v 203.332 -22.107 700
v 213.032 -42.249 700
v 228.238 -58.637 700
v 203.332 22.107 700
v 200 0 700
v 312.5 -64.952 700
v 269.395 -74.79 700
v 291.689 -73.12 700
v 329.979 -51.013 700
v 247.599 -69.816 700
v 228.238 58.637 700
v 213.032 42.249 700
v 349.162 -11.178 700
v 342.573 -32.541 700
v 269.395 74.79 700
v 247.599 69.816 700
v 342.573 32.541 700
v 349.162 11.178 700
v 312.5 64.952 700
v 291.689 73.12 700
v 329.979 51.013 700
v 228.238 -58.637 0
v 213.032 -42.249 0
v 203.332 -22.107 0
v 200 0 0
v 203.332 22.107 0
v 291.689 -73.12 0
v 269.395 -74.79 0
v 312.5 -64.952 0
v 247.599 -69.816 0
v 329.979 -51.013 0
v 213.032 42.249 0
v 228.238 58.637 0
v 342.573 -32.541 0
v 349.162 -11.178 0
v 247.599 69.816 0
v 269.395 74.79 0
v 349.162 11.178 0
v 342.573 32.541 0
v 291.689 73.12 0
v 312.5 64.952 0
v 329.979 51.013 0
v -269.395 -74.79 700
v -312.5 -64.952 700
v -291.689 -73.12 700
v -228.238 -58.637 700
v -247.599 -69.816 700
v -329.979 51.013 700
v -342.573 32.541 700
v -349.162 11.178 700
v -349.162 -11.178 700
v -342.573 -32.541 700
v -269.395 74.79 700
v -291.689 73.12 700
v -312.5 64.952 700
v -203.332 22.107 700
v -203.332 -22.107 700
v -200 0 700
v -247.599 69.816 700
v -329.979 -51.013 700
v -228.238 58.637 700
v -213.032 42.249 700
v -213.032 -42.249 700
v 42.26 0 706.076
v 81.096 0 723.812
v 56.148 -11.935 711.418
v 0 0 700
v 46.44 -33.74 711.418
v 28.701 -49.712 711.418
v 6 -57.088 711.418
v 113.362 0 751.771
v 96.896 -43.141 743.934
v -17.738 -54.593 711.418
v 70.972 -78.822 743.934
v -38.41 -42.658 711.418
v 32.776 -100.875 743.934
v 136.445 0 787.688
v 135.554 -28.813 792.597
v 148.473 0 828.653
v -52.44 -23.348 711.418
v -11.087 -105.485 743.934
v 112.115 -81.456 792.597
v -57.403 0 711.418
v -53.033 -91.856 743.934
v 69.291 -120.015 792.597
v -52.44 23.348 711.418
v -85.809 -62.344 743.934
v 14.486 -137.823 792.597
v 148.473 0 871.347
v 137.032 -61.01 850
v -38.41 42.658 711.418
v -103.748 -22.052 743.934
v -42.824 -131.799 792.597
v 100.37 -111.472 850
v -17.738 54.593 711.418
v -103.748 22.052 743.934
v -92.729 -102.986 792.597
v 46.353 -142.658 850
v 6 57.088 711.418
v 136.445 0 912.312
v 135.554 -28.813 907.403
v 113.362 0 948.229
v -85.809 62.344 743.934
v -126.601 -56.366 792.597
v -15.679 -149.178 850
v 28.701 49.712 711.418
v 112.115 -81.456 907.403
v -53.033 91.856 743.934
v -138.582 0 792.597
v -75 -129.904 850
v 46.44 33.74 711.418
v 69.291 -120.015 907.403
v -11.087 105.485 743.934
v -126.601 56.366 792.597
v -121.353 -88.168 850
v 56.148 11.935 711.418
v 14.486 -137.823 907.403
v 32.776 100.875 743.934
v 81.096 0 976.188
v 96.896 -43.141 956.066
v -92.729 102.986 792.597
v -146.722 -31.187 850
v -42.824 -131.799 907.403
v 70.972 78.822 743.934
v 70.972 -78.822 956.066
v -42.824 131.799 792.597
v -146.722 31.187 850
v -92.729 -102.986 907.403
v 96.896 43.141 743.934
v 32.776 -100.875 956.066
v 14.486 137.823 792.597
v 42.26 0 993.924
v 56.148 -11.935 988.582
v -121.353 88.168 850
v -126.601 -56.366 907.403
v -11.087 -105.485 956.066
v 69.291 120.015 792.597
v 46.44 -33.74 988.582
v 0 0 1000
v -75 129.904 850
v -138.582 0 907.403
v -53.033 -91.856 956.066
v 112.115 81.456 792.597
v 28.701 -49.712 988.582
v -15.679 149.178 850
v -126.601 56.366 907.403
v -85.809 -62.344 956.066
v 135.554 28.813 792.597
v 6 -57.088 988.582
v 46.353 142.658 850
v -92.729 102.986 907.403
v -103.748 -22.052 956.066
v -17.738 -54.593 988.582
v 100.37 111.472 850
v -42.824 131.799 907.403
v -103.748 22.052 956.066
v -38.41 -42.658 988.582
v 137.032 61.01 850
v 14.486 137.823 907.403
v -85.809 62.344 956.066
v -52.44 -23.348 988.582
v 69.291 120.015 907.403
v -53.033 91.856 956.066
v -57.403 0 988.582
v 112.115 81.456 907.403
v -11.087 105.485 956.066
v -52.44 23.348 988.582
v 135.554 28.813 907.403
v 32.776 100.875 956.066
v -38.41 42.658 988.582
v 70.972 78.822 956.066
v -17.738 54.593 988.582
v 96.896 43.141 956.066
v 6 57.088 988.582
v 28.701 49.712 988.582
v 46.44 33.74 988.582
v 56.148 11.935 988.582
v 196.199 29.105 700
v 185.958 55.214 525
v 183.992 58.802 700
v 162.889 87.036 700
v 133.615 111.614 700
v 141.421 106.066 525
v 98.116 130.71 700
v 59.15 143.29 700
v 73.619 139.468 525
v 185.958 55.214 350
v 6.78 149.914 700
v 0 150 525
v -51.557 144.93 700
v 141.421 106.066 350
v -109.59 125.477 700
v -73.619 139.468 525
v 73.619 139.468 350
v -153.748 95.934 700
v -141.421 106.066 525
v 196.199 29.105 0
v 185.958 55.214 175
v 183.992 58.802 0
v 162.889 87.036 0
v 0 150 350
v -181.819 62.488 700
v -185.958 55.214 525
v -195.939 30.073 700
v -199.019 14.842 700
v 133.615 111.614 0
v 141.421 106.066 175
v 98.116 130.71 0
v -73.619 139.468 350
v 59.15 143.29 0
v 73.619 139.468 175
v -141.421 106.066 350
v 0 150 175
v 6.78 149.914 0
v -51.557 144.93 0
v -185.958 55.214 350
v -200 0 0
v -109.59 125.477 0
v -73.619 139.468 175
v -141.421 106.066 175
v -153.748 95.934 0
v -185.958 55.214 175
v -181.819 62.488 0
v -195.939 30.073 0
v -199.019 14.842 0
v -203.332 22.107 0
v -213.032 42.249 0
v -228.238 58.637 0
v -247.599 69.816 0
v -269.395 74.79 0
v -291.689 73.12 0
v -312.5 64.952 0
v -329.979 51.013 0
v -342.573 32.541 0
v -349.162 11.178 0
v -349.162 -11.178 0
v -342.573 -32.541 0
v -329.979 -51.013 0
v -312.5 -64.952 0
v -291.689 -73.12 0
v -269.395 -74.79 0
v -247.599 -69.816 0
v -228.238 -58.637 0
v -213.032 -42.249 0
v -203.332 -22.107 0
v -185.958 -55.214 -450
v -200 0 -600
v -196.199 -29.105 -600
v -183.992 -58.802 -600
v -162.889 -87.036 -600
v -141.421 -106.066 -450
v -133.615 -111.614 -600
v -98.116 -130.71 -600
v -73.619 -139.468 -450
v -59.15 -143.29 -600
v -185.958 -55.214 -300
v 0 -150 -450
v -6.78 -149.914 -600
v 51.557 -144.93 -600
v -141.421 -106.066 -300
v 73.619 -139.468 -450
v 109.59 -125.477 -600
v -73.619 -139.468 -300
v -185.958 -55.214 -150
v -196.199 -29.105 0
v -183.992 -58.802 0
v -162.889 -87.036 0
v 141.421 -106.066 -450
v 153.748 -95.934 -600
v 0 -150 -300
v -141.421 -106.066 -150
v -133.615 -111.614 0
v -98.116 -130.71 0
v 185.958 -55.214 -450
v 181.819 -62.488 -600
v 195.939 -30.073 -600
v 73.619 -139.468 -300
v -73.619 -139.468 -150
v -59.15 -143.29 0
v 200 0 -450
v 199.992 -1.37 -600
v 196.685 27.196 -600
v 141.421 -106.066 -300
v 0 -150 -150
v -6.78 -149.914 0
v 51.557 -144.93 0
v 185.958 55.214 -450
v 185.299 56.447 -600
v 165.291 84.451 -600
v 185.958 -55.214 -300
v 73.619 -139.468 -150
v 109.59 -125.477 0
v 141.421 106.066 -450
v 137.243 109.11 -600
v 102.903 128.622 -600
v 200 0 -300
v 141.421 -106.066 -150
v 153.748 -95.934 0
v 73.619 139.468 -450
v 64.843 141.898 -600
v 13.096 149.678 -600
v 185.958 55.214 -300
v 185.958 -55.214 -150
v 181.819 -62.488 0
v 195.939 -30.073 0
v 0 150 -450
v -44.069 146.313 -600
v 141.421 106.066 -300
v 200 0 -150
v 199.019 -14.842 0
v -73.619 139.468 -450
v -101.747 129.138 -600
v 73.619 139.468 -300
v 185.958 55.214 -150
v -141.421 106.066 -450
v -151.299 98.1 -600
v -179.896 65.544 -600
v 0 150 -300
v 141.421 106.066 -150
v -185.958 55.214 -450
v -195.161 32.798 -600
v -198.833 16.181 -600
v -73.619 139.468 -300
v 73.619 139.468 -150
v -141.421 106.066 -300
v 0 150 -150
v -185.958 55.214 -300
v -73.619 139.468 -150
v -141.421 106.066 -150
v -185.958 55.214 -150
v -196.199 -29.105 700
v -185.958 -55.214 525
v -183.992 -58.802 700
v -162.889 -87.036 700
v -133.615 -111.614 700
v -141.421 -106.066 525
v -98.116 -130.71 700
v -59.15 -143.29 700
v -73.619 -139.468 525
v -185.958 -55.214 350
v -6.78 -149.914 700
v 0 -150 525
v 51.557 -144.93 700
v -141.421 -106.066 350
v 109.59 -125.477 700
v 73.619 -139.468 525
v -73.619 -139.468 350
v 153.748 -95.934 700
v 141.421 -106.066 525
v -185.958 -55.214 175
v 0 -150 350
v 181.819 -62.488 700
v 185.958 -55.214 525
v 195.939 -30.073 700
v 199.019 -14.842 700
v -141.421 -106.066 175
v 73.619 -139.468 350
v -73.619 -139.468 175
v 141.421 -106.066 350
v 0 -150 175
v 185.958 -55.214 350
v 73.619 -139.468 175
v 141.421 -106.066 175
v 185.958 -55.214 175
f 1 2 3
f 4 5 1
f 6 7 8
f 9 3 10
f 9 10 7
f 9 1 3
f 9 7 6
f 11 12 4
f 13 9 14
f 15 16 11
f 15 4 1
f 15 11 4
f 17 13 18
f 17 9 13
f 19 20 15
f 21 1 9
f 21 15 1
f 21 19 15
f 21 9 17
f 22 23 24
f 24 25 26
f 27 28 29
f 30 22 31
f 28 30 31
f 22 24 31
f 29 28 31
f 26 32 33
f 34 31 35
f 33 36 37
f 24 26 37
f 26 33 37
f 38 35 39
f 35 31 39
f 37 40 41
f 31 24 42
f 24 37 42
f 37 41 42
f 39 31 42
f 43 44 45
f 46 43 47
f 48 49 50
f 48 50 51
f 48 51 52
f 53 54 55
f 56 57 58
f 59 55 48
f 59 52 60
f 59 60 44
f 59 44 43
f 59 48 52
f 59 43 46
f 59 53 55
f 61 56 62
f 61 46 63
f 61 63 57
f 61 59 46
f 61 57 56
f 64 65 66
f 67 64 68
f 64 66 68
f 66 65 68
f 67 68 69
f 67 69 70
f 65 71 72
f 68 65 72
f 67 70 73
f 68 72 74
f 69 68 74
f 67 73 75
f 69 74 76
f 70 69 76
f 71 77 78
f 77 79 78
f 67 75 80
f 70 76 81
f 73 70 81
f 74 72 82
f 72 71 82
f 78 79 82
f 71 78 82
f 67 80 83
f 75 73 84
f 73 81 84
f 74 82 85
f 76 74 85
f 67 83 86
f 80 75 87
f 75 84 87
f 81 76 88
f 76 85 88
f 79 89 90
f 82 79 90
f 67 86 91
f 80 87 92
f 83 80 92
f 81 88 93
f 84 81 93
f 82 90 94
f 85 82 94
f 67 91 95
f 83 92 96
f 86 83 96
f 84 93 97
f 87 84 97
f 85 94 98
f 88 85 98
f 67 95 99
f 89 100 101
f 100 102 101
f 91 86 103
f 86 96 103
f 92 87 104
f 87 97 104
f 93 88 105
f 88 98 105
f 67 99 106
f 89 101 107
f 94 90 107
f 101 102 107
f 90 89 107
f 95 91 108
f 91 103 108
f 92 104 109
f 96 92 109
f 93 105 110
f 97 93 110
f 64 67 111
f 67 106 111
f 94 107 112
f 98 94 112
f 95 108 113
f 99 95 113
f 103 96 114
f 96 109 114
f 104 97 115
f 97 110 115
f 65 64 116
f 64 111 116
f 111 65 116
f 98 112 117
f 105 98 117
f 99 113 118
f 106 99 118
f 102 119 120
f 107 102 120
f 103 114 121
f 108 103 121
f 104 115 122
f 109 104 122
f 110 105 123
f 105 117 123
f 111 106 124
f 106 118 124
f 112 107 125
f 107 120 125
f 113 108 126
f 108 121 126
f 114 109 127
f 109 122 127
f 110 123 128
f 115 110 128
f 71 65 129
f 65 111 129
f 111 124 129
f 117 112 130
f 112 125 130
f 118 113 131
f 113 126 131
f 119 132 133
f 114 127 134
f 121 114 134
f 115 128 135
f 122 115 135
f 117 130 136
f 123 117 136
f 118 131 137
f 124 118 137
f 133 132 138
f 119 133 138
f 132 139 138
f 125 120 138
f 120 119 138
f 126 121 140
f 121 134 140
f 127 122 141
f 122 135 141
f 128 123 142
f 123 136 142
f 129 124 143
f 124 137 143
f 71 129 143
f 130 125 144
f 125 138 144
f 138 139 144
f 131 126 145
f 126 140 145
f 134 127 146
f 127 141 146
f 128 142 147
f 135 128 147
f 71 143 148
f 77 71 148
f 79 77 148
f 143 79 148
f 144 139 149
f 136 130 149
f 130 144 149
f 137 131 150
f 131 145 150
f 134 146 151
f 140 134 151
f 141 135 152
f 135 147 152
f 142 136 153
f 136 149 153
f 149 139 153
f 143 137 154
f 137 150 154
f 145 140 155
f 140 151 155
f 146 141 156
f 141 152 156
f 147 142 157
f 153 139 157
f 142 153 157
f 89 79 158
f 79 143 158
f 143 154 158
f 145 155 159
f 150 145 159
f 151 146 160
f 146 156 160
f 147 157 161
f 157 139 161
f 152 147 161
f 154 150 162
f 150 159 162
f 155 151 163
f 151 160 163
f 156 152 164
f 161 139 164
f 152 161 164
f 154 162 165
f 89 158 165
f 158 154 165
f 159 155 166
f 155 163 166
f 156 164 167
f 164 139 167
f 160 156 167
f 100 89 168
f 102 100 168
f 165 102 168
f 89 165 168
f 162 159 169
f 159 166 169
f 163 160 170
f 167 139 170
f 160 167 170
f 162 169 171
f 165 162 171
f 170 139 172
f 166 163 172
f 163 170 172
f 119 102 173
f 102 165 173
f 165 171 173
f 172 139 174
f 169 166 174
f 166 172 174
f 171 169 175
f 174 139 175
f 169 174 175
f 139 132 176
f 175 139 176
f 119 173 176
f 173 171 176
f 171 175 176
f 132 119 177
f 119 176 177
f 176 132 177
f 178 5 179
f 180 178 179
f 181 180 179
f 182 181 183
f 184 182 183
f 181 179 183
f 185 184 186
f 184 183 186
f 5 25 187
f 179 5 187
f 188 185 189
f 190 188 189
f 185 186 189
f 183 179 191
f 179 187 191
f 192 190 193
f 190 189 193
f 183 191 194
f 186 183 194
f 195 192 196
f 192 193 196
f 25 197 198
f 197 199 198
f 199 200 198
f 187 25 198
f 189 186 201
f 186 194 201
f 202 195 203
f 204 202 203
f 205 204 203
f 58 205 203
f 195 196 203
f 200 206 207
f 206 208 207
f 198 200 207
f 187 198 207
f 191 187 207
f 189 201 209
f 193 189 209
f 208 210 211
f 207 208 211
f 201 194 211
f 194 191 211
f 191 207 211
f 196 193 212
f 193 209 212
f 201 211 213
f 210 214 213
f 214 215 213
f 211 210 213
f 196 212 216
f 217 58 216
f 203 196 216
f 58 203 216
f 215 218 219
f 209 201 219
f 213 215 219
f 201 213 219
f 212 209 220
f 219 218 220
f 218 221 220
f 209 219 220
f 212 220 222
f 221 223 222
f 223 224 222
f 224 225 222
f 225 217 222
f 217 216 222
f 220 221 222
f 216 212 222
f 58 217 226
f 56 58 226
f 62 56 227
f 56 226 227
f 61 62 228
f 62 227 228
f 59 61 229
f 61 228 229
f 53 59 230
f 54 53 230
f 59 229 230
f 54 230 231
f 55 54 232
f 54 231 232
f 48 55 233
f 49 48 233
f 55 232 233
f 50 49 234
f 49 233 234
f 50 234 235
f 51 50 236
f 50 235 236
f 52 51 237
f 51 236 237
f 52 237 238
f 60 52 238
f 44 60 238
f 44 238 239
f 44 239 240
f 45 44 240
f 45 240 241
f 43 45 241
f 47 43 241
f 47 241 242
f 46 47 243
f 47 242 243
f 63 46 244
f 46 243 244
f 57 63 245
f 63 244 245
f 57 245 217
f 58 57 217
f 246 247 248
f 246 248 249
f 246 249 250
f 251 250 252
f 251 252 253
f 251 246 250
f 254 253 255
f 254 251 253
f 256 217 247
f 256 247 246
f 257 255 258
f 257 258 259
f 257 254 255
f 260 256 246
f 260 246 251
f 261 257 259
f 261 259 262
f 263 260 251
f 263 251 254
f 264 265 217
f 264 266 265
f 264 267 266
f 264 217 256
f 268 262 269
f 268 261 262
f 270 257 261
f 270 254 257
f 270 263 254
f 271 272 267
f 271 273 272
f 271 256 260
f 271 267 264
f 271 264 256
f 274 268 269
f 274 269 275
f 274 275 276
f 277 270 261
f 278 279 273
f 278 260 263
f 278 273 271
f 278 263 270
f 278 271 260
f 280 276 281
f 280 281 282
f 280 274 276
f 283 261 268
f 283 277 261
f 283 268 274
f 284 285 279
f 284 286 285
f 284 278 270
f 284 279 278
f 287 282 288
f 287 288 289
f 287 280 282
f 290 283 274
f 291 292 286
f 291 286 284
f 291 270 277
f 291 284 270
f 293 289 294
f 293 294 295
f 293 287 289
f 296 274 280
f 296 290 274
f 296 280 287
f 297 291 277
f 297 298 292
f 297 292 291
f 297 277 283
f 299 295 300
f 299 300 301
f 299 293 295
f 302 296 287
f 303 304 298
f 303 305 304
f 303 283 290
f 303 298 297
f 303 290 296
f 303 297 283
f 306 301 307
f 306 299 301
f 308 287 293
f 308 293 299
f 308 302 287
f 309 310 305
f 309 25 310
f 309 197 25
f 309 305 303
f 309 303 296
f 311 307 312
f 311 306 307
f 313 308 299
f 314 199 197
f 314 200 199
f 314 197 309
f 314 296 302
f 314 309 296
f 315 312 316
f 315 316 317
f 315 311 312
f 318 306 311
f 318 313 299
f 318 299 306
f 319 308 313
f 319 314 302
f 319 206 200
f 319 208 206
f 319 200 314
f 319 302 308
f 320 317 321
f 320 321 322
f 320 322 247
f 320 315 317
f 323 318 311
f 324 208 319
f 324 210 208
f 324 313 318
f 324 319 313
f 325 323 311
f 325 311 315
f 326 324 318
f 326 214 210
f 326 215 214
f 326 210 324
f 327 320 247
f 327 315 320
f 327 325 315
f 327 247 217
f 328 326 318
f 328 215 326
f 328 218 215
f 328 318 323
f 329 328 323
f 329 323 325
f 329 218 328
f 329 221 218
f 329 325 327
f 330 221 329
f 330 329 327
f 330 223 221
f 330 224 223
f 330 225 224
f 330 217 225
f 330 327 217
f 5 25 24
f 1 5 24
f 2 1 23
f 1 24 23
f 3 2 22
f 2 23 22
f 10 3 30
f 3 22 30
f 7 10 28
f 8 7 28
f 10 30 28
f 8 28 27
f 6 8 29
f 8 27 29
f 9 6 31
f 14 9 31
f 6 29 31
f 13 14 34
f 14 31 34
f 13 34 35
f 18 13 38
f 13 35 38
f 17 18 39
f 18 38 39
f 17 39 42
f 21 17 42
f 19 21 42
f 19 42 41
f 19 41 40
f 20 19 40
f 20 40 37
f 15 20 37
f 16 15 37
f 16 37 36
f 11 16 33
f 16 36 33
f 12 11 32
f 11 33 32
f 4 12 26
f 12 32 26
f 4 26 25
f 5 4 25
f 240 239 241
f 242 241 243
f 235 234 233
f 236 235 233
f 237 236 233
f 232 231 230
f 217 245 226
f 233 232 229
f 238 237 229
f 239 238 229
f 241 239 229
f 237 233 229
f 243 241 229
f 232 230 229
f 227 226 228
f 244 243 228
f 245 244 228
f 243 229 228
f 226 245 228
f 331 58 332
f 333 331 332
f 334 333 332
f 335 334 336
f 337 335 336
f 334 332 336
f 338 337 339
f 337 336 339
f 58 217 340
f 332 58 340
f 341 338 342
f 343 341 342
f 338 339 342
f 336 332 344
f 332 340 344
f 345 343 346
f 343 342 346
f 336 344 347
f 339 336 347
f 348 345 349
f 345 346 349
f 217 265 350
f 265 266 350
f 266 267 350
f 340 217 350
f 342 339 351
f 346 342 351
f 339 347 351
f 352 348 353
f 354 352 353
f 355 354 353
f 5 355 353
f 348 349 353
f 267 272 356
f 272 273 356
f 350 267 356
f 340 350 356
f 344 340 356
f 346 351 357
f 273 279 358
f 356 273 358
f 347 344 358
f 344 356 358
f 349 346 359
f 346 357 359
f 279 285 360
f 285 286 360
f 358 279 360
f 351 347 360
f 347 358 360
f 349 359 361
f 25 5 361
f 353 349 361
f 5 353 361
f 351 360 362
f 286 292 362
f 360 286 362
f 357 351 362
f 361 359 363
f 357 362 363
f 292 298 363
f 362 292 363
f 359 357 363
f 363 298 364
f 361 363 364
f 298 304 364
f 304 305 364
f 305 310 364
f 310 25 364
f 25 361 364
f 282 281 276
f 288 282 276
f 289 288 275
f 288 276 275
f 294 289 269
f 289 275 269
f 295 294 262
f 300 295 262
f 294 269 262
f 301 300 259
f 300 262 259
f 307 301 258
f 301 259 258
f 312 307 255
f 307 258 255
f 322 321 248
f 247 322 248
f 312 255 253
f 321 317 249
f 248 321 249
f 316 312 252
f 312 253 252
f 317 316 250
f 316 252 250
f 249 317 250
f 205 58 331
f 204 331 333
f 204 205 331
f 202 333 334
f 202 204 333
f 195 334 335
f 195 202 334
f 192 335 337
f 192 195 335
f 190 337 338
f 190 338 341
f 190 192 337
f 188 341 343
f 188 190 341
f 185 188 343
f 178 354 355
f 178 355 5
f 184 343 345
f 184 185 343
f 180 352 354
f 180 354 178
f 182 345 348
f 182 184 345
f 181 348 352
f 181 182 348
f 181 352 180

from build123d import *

# Parameters (mm, degrees)
F0_R     = 75
F3_DEPTH = 700
F4_DEPTH = 600


with BuildPart() as f2:
    # F1 (on Front) → F2 (revolve)
    with BuildSketch(Plane.XZ):
        with BuildLine():
            Line((0, 1000), (0, 700))
            ThreePointArc((0, 700), (150, 850), (0, 1000))
        make_face()
    revolve(axis=Axis((0, 0, 850), (0, 0, -1)))


with BuildPart() as f3:
    # F0 (on Top) → F3 (new body)
    with BuildSketch(Plane.XY):
        with BuildLine():
            ThreePointArc((200, 0), (275, -75), (350, 0))
            ThreePointArc((350, 0), (275, 75), (200, 0))
        make_face()
        with Locations((-275, 0)):
            Circle(F0_R)
        with BuildLine():
            add(Edge.make_bspline(
                [(-200, 0), (-200, -150), (0, -150), (200, -150), (200, 0)],
                knots=[3.141593, 3.141593, 3.141593, 4.712389, 4.712389, 6.283185, 6.283185, 6.283185], degree=2, weights=[1, 0.707107, 1, 0.707107, 1]))
            add(Edge.make_bspline(
                [(200, 0), (200, 150), (0, 150), (-200, 150), (-200, 0)],
                knots=[0, 0, 0, 1.570796, 1.570796, 3.141593, 3.141593, 3.141593], degree=2, weights=[1, 0.707107, 1, 0.707107, 1]))
        make_face()
    extrude(amount=F3_DEPTH)

    # F3_face (on face) → F4 (join)
    with BuildSketch(Plane(origin=(0, 0, 0), x_dir=(1, 0, 0), z_dir=(0, 0, -1))):
        with BuildLine():
            add(Edge.make_bspline(
                [(200, 0), (200, -150), (0, -150), (-200, -150), (-200, 0)],
                knots=[0, 0, 0, 1.570796, 1.570796, 3.141593, 3.141593, 3.141593], degree=2, weights=[1, 0.707107, 1, 0.707107, 1]))
            add(Edge.make_bspline(
                [(-200, 0), (-200, 150), (0, 150), (200, 150), (200, 0)],
                knots=[3.141593, 3.141593, 3.141593, 4.712389, 4.712389, 6.283185, 6.283185, 6.283185], degree=2, weights=[1, 0.707107, 1, 0.707107, 1]))
        make_face()
    extrude(amount=F4_DEPTH)


solid = Compound([f2.part, f3.part])
